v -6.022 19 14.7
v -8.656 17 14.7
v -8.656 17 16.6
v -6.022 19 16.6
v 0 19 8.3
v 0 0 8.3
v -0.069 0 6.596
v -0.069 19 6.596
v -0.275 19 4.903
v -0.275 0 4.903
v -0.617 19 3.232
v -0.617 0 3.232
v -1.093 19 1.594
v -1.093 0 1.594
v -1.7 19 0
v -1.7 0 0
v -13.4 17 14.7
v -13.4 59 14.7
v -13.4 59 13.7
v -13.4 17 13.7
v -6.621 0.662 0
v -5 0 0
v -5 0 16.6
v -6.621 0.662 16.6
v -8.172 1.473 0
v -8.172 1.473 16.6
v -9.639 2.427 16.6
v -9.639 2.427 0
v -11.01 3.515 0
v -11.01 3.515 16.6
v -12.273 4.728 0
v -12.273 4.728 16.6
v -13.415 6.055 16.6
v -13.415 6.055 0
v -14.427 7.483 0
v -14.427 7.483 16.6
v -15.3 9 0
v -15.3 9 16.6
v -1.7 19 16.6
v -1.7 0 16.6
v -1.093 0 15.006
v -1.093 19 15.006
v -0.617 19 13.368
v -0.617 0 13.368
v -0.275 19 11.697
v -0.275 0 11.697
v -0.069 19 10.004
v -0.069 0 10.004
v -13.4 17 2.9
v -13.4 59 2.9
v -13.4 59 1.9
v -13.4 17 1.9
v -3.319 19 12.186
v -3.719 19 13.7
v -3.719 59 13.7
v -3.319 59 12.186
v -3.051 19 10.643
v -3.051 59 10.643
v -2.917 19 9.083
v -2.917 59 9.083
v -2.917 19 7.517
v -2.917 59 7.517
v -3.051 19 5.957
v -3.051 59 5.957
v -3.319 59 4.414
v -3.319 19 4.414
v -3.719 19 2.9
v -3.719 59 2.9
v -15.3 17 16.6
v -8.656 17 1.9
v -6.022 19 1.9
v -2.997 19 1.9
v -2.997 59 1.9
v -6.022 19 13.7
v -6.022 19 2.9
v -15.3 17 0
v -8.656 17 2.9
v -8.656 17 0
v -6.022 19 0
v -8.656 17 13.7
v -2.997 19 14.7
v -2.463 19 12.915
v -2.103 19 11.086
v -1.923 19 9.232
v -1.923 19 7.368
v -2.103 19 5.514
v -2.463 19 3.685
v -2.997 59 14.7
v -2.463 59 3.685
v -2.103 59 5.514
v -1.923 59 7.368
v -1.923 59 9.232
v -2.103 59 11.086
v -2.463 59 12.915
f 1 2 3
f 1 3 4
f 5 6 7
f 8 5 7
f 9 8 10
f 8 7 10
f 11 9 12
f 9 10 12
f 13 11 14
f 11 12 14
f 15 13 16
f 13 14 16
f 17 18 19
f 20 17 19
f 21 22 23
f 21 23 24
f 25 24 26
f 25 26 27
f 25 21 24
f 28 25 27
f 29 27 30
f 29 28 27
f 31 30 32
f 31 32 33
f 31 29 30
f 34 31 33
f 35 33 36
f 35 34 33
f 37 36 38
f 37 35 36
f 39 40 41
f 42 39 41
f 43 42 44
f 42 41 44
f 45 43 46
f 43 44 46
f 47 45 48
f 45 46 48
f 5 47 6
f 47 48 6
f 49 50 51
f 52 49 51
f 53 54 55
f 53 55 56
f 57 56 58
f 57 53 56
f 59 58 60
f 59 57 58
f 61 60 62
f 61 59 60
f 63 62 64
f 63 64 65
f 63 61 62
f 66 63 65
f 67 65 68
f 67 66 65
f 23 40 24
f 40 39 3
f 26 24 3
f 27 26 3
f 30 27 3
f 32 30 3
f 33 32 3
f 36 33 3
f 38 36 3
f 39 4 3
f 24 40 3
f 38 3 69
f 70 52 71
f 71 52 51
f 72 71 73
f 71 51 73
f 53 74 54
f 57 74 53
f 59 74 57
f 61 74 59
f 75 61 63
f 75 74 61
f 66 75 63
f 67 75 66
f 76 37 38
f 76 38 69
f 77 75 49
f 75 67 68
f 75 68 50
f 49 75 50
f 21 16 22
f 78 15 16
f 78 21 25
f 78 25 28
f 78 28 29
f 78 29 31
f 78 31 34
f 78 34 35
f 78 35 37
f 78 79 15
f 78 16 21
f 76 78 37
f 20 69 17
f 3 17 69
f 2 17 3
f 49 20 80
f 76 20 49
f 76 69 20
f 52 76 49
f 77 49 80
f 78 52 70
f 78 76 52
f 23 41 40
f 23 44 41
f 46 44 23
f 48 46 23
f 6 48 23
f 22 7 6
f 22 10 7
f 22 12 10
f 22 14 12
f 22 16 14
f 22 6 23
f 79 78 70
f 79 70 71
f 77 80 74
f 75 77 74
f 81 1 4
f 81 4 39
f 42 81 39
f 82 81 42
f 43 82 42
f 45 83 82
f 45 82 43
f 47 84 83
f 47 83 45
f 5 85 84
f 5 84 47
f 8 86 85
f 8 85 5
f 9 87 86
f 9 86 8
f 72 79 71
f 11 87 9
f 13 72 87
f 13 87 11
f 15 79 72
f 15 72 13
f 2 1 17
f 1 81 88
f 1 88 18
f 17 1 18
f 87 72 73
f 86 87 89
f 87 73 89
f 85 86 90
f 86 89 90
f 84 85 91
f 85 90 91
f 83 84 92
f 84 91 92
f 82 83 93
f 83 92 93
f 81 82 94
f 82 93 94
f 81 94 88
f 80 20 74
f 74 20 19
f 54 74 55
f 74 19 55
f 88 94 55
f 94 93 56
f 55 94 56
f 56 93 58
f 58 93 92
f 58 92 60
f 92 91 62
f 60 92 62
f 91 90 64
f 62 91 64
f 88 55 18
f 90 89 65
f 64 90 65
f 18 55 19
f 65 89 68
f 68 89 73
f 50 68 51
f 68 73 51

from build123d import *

# Parameters (mm, degrees)
BOSS_EXTRUDE1_DEPTH      = 16.6
CUT_EXTRUDE1_DEPTH       = 20
BOSS_EXTRUDE2_DEPTH      = 30
BOSS_EXTRUDE2_DEPTH_BACK = 16.6


with BuildPart() as part:
    # Sketch1 → Boss-Extrude1 (new body)
    with BuildSketch(Plane.XY):
        with BuildLine():
            Line((0, 0), (-5, 0))
            ThreePointArc((-5, 0), (-11.010326512, 3.515404103), (-15.3, 9))
            Line((-15.3, 9), (-15.3, 17))
            Line((-15.3, 17), (-8.655870189, 17))
            Line((-8.655870189, 17), (-6.022263631, 19))
            Line((-6.022263631, 19), (0, 19))
            Line((0, 19), (0, 0))
        make_face()
    extrude(amount=BOSS_EXTRUDE1_DEPTH)

    # Sketch2 → Cut-Extrude1 (cut, through all)
    with BuildSketch(Plane.XZ):
        with BuildLine():
            Line((0, 16.6), (-1.7, 16.6))
            ThreePointArc((-1.7, 16.6), (-0.429366175, 12.536153916), (0, 8.3))
            Line((0, 8.3), (0, 16.6))
        make_face()
        with BuildLine():
            Line((0, 0), (0, 8.3))
            ThreePointArc((0, 8.3), (-0.429366175, 4.063846084), (-1.7, 0))
            Line((-1.7, 0), (0, 0))
        make_face()
    extrude(amount=-CUT_EXTRUDE1_DEPTH, mode=Mode.SUBTRACT)

    # Sketch3 → Boss-Extrude2 (add, two sides)
    with BuildSketch(Plane(origin=(0, 29, 0), x_dir=(1, 0, 0), z_dir=(0, 1, 0))) as boss_extrude2_sk:
        with BuildLine():
            Line((-13.4, -1.9), (-2.99735323, -1.9))
            ThreePointArc((-2.99735323, -1.9), (-1.9, -8.3), (-2.99735323, -14.7))
            Line((-2.99735323, -14.7), (-13.4, -14.7))
            Line((-13.4, -14.7), (-13.4, -13.7))
            Line((-13.4, -13.7), (-12.4, -13.7))
            Line((-12.4, -13.7), (-3.71899685, -13.7))
            ThreePointArc((-3.71899685, -13.7), (-2.9, -8.3), (-3.71899685, -2.9))
            Line((-3.71899685, -2.9), (-12.4, -2.9))
            Line((-12.4, -2.9), (-13.4, -2.9))
            Line((-13.4, -2.9), (-13.4, -1.9))
        make_face()
    extrude(amount=BOSS_EXTRUDE2_DEPTH)
    extrude(boss_extrude2_sk.sketch, amount=-BOSS_EXTRUDE2_DEPTH_BACK)


solid = part.part
